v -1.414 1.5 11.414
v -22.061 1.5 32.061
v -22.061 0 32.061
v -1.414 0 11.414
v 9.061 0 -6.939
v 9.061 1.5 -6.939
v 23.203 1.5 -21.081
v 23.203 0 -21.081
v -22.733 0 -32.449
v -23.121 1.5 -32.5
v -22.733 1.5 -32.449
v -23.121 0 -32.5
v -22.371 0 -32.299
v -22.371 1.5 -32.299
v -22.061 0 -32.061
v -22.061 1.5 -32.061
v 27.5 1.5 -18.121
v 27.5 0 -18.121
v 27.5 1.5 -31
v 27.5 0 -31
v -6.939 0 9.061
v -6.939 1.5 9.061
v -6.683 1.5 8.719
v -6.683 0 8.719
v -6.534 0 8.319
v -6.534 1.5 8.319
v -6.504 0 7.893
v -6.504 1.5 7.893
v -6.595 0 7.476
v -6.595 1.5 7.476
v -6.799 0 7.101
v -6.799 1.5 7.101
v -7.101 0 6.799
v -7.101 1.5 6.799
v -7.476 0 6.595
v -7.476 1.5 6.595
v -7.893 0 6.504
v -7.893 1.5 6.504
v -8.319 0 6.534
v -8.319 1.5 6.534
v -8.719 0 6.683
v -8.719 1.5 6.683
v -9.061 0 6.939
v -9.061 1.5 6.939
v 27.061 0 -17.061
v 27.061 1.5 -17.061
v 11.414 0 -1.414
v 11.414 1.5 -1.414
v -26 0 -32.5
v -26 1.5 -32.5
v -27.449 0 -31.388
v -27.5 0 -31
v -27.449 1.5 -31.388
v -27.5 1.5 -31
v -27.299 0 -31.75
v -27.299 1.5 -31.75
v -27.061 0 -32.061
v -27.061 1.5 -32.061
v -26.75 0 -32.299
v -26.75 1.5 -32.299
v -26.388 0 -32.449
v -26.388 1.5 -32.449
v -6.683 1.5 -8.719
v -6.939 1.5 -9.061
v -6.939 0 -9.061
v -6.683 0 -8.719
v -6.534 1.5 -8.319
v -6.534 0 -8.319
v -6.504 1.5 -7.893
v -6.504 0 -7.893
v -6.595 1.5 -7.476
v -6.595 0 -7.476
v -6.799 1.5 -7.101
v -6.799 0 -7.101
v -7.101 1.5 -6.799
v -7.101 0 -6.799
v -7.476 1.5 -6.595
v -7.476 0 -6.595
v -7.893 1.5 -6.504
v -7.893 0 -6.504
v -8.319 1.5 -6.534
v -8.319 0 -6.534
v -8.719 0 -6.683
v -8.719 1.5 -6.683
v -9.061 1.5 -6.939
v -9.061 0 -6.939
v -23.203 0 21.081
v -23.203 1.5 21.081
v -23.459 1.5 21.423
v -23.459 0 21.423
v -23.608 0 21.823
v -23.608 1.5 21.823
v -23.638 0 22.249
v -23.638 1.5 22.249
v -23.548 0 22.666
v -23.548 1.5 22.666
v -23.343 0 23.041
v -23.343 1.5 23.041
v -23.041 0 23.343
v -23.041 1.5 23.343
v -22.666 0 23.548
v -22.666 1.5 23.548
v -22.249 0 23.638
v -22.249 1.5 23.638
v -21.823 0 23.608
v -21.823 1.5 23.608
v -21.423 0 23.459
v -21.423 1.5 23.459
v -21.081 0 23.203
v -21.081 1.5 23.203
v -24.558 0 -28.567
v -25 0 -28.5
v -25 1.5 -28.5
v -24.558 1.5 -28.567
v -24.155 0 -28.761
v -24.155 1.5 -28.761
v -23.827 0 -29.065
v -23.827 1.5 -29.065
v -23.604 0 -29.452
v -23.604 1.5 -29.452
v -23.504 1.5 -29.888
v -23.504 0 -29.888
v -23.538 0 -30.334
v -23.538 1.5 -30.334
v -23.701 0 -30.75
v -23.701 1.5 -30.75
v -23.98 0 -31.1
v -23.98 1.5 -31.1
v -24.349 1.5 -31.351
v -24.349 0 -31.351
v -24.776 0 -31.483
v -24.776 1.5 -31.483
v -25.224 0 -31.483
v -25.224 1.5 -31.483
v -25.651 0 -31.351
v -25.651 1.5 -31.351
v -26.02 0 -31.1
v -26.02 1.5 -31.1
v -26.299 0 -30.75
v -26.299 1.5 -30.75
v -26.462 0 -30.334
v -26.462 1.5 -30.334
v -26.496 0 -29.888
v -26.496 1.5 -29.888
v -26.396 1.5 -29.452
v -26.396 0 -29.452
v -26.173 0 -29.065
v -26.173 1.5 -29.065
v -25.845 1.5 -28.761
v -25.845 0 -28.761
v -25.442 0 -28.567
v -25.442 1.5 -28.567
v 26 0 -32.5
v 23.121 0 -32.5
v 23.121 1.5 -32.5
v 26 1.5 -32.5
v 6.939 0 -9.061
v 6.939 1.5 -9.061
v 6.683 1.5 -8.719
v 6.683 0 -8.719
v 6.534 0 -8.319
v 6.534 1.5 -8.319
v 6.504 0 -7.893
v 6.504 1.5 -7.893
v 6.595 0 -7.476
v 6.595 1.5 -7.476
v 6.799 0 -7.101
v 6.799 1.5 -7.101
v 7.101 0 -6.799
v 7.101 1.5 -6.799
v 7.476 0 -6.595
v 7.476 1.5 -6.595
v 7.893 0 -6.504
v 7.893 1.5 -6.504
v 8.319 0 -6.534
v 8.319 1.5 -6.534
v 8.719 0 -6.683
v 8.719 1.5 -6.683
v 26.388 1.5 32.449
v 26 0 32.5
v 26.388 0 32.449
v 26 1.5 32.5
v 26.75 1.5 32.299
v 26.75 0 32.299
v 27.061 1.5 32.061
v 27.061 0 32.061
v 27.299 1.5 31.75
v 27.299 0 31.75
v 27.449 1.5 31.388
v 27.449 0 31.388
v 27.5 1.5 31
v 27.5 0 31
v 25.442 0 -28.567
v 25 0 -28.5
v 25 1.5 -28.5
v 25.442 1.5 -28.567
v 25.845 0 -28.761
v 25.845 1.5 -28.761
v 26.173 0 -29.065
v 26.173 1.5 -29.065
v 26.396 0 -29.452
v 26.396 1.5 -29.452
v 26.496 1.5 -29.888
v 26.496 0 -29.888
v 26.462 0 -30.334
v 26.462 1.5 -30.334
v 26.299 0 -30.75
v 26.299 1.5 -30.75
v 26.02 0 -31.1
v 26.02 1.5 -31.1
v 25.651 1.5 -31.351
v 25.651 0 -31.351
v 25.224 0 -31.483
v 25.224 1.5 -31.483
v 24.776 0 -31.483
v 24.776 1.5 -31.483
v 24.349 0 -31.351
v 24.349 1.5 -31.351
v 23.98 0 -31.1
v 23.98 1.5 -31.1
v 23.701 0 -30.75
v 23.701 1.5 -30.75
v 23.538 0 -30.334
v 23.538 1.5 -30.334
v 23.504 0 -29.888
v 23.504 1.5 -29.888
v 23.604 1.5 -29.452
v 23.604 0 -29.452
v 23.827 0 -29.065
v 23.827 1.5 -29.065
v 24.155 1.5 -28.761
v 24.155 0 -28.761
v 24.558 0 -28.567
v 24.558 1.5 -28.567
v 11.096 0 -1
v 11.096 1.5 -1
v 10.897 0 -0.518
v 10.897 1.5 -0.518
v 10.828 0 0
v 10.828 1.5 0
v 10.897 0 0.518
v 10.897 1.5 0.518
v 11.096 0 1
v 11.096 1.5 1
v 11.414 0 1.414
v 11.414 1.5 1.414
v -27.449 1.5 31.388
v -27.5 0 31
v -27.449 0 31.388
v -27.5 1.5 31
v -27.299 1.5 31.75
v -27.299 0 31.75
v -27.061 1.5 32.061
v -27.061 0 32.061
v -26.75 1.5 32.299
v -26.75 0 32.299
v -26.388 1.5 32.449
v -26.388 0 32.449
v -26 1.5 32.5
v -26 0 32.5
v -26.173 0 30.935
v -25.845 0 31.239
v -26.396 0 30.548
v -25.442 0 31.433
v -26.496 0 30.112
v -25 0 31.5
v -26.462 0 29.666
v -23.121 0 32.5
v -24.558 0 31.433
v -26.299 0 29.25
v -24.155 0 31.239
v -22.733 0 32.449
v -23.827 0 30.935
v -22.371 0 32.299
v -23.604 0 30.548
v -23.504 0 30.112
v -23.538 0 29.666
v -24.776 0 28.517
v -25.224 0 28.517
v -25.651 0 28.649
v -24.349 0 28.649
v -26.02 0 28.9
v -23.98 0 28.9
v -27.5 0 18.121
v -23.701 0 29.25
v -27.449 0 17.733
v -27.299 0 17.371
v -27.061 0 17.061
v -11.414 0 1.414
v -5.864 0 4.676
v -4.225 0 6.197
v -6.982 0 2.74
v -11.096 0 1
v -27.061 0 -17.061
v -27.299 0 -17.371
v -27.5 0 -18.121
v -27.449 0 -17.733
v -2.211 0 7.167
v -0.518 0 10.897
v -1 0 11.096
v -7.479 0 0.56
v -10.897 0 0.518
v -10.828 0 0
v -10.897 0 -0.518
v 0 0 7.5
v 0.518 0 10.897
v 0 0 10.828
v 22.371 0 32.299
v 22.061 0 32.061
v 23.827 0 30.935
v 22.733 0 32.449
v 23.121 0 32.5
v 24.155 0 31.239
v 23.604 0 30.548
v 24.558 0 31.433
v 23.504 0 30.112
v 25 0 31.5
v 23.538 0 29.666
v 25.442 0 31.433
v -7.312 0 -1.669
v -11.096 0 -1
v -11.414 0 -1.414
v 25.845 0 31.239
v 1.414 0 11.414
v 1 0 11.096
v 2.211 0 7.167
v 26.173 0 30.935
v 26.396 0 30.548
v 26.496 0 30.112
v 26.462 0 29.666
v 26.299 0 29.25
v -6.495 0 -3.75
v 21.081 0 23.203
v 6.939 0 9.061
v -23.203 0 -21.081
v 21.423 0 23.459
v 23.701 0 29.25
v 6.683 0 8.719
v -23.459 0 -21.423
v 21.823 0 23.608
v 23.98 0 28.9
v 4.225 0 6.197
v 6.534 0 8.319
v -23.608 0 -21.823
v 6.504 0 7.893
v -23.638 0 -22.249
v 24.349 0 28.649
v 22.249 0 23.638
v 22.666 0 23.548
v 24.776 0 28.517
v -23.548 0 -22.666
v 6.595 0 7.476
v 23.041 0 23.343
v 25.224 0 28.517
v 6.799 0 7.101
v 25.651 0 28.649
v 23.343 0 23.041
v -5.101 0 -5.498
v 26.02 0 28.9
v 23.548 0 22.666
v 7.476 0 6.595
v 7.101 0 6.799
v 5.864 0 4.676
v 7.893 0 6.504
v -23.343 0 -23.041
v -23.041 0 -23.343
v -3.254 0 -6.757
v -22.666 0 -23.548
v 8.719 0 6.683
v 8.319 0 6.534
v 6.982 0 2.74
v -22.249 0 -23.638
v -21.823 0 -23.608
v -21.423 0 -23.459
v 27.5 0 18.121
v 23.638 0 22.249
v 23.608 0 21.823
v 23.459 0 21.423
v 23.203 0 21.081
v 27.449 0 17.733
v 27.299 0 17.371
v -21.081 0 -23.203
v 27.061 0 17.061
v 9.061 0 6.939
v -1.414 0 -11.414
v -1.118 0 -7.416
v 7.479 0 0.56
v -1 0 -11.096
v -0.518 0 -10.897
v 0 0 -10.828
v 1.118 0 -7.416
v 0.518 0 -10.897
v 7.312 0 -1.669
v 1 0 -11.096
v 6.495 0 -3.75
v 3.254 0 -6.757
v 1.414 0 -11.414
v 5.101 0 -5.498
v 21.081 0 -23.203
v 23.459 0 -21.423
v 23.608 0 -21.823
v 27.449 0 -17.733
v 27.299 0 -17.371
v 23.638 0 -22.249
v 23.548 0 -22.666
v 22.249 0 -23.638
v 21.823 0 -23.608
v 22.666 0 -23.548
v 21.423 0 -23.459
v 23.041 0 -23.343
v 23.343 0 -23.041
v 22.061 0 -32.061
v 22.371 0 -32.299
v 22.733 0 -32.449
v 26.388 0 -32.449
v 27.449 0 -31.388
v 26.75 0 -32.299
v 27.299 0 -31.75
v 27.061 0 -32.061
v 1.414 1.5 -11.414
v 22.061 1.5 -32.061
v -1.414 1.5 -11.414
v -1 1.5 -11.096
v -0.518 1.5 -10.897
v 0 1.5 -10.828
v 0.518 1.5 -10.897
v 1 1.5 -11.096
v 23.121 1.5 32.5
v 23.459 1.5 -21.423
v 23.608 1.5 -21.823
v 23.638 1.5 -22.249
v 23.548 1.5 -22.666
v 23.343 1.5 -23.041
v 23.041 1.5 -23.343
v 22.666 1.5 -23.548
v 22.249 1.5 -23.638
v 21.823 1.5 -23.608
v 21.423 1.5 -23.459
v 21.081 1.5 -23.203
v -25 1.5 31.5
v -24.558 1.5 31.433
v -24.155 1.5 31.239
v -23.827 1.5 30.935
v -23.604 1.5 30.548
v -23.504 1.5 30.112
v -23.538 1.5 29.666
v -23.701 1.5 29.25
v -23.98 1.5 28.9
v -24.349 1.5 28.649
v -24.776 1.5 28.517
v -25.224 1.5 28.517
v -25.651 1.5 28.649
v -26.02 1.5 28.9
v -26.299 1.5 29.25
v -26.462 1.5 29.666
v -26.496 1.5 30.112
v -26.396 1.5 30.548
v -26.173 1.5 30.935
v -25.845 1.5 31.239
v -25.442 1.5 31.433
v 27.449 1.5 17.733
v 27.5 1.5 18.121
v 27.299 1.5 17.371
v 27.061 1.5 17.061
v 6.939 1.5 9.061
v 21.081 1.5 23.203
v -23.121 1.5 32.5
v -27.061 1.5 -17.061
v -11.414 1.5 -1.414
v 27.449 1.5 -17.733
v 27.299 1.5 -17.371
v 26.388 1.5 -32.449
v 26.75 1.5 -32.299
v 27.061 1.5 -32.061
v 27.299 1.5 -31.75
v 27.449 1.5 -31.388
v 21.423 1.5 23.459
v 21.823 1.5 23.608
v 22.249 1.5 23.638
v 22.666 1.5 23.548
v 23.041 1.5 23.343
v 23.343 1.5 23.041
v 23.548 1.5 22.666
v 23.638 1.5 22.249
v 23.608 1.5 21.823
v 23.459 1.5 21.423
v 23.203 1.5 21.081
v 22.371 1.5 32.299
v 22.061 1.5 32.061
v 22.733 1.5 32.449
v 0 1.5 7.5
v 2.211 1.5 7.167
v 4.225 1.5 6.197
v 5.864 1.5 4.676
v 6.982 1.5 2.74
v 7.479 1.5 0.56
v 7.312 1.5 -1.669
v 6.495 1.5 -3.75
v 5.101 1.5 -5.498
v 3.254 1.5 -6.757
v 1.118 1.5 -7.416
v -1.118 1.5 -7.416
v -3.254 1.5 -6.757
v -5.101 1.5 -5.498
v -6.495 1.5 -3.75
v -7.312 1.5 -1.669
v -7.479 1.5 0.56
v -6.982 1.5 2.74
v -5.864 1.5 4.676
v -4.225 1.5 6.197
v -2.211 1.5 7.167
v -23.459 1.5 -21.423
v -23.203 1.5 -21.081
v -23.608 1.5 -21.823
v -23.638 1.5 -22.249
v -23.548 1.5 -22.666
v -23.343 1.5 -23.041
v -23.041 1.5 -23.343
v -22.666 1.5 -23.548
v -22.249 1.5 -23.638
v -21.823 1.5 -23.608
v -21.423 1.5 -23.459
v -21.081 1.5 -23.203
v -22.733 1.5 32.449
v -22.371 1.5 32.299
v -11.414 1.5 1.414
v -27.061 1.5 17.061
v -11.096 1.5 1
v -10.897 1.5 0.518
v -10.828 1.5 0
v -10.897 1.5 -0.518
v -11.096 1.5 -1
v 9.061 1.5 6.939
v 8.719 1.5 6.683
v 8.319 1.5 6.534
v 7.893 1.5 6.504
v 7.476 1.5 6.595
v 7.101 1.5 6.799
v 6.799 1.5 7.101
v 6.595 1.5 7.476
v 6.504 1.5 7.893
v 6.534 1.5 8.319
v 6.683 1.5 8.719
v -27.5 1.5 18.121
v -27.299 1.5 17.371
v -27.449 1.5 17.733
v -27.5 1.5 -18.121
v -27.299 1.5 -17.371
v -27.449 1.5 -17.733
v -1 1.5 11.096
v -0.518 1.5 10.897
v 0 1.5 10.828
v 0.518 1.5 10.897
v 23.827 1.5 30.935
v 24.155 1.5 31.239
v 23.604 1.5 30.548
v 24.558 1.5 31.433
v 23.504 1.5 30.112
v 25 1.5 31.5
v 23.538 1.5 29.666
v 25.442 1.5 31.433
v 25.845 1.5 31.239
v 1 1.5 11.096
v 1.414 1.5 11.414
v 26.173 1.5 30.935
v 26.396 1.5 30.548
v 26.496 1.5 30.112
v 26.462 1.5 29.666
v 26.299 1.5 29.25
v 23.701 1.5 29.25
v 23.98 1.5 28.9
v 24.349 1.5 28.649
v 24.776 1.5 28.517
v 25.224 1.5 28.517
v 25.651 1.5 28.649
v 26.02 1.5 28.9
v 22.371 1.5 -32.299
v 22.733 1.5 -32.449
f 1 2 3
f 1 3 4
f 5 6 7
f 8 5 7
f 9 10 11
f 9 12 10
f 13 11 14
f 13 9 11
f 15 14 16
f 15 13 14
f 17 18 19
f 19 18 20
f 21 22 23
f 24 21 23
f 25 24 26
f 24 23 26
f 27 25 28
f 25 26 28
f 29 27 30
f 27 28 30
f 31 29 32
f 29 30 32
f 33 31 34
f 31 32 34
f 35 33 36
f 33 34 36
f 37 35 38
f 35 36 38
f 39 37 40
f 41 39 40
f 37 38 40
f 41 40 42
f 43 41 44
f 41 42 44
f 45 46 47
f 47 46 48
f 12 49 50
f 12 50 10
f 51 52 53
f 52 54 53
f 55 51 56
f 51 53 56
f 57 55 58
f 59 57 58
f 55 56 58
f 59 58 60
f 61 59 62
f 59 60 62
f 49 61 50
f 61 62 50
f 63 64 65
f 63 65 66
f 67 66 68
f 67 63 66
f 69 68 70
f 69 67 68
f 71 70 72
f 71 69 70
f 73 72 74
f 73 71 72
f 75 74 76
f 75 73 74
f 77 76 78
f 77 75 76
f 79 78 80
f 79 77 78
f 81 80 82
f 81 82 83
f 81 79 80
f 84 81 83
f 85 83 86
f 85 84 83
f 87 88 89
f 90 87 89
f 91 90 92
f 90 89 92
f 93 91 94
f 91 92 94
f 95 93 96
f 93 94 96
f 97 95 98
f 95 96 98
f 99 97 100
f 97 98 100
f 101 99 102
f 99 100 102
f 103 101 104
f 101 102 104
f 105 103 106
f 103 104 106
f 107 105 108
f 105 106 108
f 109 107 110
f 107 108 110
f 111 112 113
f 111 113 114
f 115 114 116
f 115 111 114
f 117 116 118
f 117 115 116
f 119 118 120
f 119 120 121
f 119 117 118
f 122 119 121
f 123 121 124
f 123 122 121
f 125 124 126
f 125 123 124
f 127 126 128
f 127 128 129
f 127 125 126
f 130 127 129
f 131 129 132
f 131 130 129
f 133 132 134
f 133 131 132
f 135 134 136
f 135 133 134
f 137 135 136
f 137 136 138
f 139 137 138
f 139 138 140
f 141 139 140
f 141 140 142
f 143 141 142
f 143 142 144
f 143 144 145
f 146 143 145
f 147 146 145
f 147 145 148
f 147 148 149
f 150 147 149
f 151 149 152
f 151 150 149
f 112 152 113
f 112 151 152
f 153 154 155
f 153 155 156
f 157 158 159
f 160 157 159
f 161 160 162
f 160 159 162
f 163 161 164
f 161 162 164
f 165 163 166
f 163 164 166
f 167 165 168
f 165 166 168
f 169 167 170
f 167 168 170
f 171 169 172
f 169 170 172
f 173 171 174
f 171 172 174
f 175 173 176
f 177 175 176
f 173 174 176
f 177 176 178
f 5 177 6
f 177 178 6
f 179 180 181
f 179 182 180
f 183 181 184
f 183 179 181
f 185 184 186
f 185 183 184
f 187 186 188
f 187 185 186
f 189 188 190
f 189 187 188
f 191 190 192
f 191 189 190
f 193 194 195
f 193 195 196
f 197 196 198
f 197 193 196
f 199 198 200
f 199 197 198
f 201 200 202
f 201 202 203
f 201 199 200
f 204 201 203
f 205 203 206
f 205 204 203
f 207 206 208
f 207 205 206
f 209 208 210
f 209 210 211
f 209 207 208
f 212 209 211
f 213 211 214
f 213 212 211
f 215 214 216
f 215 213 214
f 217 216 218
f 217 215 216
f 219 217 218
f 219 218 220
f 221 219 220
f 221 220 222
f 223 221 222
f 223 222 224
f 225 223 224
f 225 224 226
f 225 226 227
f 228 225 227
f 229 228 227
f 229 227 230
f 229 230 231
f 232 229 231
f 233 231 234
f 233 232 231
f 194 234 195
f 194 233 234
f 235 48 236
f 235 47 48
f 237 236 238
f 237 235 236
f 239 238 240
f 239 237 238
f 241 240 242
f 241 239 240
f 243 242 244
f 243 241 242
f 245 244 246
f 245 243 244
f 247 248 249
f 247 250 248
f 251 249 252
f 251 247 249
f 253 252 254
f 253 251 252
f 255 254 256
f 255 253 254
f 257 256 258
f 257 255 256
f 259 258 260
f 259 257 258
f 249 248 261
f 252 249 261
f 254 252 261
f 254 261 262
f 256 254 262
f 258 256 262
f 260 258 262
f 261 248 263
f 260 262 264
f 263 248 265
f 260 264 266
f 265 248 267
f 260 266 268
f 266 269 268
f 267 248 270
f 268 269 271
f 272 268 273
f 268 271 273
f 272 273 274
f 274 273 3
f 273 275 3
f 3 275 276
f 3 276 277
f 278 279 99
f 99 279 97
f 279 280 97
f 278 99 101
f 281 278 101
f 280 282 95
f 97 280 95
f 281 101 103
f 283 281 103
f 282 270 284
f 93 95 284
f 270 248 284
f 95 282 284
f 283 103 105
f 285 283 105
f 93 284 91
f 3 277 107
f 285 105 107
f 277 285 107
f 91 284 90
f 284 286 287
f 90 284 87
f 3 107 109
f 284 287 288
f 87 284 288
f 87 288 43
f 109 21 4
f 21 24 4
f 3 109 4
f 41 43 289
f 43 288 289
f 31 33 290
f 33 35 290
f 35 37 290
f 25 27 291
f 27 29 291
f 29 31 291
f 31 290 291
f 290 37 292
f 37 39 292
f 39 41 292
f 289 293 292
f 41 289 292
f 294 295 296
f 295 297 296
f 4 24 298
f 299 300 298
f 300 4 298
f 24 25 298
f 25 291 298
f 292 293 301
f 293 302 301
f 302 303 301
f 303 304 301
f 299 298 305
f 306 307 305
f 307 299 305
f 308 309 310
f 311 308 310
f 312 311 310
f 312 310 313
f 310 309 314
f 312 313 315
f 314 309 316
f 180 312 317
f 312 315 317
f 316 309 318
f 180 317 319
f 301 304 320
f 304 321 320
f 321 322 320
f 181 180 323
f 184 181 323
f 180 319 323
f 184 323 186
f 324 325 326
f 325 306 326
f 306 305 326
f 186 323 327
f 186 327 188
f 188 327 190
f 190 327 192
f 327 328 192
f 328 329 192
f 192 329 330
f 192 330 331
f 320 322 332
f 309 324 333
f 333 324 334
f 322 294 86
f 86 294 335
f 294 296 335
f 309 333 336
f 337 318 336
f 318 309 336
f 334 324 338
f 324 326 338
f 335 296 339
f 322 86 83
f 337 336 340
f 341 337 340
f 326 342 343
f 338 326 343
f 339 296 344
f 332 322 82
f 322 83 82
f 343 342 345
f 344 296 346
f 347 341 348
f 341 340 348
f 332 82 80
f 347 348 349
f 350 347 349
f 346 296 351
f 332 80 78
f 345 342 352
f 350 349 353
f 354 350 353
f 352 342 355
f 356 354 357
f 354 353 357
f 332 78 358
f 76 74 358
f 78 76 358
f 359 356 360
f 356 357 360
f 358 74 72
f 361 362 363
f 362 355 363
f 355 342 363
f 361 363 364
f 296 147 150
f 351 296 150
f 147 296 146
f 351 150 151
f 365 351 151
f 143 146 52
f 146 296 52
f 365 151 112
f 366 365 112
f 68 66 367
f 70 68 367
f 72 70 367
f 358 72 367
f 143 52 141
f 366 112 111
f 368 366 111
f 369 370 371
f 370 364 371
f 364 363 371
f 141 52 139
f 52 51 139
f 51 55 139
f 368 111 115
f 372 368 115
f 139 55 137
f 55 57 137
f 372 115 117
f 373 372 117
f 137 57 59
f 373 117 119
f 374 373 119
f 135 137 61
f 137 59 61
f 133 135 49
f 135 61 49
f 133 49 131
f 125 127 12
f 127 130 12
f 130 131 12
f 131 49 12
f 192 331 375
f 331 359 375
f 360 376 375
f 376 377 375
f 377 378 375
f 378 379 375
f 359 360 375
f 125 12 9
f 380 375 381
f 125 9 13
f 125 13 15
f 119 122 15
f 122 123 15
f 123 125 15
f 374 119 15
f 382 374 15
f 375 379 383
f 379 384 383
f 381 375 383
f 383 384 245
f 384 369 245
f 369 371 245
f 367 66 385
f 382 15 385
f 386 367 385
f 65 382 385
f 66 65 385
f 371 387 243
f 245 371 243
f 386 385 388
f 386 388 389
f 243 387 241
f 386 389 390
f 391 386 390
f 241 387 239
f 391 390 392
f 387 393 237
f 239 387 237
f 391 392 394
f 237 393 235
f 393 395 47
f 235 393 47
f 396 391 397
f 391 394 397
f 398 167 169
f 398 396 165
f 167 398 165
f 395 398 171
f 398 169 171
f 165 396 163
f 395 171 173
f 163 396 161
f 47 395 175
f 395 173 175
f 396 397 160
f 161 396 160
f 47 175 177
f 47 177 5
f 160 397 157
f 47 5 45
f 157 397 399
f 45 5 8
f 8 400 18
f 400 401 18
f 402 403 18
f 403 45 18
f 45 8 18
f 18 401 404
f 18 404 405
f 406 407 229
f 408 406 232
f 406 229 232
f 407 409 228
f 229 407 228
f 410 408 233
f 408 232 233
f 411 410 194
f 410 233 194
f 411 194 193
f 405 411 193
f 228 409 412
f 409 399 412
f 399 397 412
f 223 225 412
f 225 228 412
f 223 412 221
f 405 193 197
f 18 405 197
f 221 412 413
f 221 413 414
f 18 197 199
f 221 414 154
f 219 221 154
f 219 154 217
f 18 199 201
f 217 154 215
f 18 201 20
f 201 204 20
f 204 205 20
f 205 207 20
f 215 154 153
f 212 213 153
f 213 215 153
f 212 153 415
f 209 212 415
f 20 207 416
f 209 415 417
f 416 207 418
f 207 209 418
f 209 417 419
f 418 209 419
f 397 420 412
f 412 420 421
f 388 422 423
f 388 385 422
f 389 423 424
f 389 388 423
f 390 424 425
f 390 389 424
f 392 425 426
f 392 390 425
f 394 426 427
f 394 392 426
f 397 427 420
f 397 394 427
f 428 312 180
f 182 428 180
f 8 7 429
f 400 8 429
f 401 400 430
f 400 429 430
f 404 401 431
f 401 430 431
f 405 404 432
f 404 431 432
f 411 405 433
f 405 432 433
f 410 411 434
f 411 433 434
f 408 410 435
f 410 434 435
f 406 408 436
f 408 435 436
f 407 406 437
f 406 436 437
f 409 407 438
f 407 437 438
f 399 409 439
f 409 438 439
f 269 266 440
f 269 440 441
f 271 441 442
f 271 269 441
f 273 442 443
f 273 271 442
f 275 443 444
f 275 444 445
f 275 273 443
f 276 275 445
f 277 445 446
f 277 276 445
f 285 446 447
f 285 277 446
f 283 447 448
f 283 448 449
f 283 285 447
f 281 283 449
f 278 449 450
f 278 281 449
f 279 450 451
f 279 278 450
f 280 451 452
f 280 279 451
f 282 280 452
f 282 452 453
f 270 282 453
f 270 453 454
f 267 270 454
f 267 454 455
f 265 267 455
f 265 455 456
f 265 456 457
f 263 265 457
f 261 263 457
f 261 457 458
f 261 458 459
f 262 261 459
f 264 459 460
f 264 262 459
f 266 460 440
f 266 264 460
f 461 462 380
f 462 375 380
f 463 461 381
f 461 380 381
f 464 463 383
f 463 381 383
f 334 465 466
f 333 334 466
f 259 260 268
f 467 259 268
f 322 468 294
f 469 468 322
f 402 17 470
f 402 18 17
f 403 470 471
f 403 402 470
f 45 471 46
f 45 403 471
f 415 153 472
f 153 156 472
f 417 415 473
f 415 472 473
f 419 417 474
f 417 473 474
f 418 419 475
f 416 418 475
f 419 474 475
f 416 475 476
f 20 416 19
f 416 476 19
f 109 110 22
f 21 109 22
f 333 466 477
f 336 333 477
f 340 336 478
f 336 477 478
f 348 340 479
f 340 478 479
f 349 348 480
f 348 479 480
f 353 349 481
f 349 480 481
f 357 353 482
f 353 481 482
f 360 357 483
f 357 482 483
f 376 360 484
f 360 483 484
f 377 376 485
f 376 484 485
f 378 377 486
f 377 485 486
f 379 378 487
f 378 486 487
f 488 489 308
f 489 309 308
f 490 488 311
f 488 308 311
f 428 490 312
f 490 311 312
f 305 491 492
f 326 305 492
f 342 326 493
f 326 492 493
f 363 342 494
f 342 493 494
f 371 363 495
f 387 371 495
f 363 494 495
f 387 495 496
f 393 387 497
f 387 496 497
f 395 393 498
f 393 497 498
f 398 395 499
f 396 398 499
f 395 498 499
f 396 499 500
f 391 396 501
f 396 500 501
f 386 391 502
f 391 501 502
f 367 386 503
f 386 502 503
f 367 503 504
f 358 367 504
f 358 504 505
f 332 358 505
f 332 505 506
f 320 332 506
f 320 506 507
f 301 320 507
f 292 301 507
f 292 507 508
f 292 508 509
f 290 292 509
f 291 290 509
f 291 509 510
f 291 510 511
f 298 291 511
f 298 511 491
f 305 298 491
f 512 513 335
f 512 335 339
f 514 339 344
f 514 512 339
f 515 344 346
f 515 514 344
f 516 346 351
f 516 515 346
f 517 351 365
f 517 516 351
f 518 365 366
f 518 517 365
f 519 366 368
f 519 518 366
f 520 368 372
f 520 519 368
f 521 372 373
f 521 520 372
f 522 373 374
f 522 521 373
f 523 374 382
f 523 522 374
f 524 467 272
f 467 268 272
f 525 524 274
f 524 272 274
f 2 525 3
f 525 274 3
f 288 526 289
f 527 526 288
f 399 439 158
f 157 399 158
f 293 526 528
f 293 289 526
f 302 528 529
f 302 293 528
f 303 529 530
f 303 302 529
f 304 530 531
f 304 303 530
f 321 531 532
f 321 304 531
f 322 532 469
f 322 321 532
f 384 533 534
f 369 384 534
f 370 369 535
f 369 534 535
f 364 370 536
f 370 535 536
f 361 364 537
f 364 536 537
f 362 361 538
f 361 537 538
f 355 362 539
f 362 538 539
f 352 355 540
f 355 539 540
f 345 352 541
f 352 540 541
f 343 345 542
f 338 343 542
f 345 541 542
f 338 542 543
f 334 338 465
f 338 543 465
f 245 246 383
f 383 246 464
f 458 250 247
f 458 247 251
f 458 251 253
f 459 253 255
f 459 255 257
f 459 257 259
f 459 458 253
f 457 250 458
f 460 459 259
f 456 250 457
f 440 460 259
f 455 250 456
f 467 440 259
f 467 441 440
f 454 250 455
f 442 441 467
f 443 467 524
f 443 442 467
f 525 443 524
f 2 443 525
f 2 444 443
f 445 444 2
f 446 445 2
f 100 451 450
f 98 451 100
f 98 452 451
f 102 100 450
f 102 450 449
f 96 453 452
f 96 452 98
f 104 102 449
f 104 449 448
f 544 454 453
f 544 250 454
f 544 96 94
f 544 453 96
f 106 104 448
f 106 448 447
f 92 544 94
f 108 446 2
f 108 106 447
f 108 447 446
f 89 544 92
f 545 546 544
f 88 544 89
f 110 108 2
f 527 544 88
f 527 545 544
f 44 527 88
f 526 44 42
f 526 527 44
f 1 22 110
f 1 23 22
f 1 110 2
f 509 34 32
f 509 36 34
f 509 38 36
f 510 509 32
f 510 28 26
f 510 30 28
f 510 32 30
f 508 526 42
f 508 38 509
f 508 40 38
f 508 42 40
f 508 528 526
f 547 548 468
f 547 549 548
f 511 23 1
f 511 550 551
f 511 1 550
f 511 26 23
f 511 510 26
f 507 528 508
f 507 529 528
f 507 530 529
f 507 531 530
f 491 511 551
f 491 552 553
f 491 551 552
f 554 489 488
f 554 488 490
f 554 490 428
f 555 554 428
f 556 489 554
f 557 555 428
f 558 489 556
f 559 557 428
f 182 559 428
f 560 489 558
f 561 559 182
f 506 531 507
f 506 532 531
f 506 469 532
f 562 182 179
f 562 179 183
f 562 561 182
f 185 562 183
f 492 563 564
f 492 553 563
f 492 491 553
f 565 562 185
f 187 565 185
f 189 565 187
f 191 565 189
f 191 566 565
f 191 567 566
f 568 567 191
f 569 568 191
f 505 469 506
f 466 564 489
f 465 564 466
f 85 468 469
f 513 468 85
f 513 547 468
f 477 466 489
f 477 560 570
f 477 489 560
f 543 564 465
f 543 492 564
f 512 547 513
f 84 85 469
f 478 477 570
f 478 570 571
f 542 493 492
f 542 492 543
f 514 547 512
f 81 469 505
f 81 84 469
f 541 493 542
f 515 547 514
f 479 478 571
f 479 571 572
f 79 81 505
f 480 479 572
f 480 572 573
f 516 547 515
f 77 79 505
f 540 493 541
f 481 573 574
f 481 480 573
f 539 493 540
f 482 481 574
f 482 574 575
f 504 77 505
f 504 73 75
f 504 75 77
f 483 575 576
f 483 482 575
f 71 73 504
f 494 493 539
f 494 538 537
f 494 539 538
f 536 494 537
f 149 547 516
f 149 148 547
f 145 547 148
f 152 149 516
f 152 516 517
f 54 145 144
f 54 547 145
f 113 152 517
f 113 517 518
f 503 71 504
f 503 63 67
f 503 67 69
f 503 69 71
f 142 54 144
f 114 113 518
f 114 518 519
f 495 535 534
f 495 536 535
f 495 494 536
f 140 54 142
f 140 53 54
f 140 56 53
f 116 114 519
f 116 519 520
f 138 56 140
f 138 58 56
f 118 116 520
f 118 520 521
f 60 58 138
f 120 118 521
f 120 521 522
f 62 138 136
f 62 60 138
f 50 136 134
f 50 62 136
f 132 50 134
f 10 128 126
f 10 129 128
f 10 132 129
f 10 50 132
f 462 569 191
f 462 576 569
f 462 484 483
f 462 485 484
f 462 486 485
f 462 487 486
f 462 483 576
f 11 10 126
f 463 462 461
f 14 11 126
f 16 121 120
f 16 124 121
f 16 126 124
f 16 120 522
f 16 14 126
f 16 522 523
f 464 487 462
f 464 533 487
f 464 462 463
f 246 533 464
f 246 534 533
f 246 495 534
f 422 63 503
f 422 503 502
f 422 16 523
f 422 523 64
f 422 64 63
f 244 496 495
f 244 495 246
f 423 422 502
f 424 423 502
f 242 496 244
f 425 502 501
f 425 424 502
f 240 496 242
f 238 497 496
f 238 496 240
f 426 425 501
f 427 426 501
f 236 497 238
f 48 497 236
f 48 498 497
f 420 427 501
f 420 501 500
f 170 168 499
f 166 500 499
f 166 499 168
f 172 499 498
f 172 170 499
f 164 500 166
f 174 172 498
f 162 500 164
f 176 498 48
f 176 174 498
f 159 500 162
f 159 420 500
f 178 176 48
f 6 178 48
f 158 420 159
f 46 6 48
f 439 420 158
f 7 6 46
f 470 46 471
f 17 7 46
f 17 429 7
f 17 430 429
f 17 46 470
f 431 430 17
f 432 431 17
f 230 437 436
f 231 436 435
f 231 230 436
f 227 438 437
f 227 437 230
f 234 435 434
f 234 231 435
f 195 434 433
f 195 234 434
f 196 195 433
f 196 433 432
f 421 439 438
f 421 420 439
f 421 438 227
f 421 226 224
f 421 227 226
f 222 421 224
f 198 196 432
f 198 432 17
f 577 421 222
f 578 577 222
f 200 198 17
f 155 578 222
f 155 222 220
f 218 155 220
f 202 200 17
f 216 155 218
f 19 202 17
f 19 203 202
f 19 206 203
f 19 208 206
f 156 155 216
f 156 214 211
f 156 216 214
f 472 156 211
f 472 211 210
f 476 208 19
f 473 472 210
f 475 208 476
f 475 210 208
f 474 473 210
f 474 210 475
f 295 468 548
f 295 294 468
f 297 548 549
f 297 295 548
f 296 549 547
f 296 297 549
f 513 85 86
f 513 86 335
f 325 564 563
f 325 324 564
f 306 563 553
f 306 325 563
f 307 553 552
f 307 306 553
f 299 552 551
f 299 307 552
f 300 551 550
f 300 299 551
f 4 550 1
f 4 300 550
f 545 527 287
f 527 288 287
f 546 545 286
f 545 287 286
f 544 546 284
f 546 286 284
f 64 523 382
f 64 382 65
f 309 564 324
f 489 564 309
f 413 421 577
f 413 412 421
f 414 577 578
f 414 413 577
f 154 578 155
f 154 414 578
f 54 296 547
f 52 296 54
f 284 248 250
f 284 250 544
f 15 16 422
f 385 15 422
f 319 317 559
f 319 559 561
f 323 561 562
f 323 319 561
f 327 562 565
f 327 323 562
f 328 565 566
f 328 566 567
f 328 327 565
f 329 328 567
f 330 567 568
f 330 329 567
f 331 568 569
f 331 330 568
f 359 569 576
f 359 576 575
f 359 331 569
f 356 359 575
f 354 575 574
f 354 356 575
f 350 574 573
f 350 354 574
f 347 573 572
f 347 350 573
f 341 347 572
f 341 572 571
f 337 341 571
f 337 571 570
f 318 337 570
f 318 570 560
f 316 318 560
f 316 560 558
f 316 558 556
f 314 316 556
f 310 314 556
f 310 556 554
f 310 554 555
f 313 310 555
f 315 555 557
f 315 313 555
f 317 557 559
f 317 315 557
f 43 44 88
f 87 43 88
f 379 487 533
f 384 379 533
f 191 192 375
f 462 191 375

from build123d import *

# Parameters (mm, degrees)
SKETCH_1_W          = 55
SKETCH_1_H          = 65
SKETCH_1_R          = 1.5
EXTRUDE_1_DEPTH     = 1.5
CUT_EXTRUDE_1_DEPTH = 1.5
SKETCH_3_R          = 7.5
CUT_EXTRUDE_2_DEPTH = 43.599882629
FILLET_1_R          = 2
FILLET_2_R          = 1.5


with BuildPart() as part:
    # 草图1 → 凸台-拉伸1 (new body)
    with BuildSketch(Plane(origin=(0, 0, 0), x_dir=(1, 0, 0), z_dir=(0, 1, 0))):
        Rectangle(SKETCH_1_W, SKETCH_1_H)
        with Locations(Location((-25, 30, 0), (0, 0, 270))):
            Circle(SKETCH_1_R, mode=Mode.SUBTRACT)
        with Locations(Location((25, 30, 0), (0, 0, 270))):
            Circle(SKETCH_1_R, mode=Mode.SUBTRACT)
        with Locations(Location((25, -30, 0), (0, 0, 270))):
            Circle(SKETCH_1_R, mode=Mode.SUBTRACT)
        with Locations(Location((-25, -30, 0), (0, 0, 270))):
            Circle(SKETCH_1_R, mode=Mode.SUBTRACT)
    extrude(amount=EXTRUDE_1_DEPTH)

    # 草图2 → 切除-拉伸1 (cut)
    with BuildSketch(Plane(origin=(0, 1.5, 0), x_dir=(1, 0, 0), z_dir=(0, 1, 0))):
        with BuildLine():
            Line((-21.081475452, 23.202795796), (-6.939339828, 9.060660172))
            ThreePointArc((-6.939339828, 9.060660172), (-6.939339828, 6.939339828), (-9.060660172, 6.939339828))
            Line((-9.060660172, 6.939339828), (-23.202795796, 21.081475452))
            ThreePointArc((-23.202795796, 21.081475452), (-23.202795796, 23.202795796), (-21.081475452, 23.202795796))
        make_face()
        with BuildLine():
            Line((21.081475452, 23.202795796), (6.939339828, 9.060660172))
            ThreePointArc((6.939339828, 9.060660172), (6.939339828, 6.939339828), (9.060660172, 6.939339828))
            Line((9.060660172, 6.939339828), (23.202795796, 21.081475452))
            ThreePointArc((23.202795796, 21.081475452), (23.202795796, 23.202795796), (21.081475452, 23.202795796))
        make_face()
        with BuildLine():
            Line((23.202795796, -21.081475452), (9.060660172, -6.939339828))
            ThreePointArc((9.060660172, -6.939339828), (6.939339828, -6.939339828), (6.939339828, -9.060660172))
            Line((6.939339828, -9.060660172), (21.081475452, -23.202795796))
            ThreePointArc((21.081475452, -23.202795796), (23.202795796, -23.202795796), (23.202795796, -21.081475452))
        make_face()
        with BuildLine():
            Line((-21.081475452, -23.202795796), (-6.939339828, -9.060660172))
            ThreePointArc((-6.939339828, -9.060660172), (-6.939339828, -6.939339828), (-9.060660172, -6.939339828))
            Line((-9.060660172, -6.939339828), (-23.202795796, -21.081475452))
            ThreePointArc((-23.202795796, -21.081475452), (-23.202795796, -23.202795796), (-21.081475452, -23.202795796))
        make_face()
    extrude(amount=-CUT_EXTRUDE_1_DEPTH, mode=Mode.SUBTRACT)

    # 草图3 → 切除-拉伸2 (cut, through all)
    with BuildSketch(Plane(origin=(0, 1.5, 0), x_dir=(1, 0, 0), z_dir=(0, 1, 0))):
        with Locations(Location((0, 0, 0), (0, 0, 270))):
            Circle(SKETCH_3_R)
        Polygon((-22.5, 32.5), (0, 10), (22.5, 32.5), align=None)
        Polygon((-27.5, 17.5), (-10, 0), (-27.5, -17.5), align=None)
        Polygon((10, 0), (27.5, -17.5), (27.5, 17.5), align=None)
        Polygon((0, -10), (22.5, -32.5), (-22.5, -32.5), align=None)
    extrude(amount=-CUT_EXTRUDE_2_DEPTH, mode=Mode.SUBTRACT)

    # 圆角1
    fillet_1_edges = [part.edges().sort_by_distance(p)[0] for p in [
        (-10, 0.75, 0),
        (10, 0.75, 0),
        (0, 0.75, 10),
        (0, 0.75, -10),
    ]]
    fillet(fillet_1_edges, radius=FILLET_1_R)

    # 圆角2
    fillet_2_edges = [part.edges().sort_by_distance(p)[0] for p in [
        (-27.5, 0.75, 17.5),
        (-27.5, 0.75, -17.5),
        (27.5, 0.75, -17.5),
        (27.5, 0.75, 17.5),
        (-22.5, 0.75, 32.5),
        (22.5, 0.75, 32.5),
        (-22.5, 0.75, -32.5),
        (22.5, 0.75, -32.5),
        (27.5, 0.75, 32.5),
        (-27.5, 0.75, 32.5),
        (-27.5, 0.75, -32.5),
        (27.5, 0.75, -32.5),
    ]]
    fillet(fillet_2_edges, radius=FILLET_2_R)


solid = part.part
